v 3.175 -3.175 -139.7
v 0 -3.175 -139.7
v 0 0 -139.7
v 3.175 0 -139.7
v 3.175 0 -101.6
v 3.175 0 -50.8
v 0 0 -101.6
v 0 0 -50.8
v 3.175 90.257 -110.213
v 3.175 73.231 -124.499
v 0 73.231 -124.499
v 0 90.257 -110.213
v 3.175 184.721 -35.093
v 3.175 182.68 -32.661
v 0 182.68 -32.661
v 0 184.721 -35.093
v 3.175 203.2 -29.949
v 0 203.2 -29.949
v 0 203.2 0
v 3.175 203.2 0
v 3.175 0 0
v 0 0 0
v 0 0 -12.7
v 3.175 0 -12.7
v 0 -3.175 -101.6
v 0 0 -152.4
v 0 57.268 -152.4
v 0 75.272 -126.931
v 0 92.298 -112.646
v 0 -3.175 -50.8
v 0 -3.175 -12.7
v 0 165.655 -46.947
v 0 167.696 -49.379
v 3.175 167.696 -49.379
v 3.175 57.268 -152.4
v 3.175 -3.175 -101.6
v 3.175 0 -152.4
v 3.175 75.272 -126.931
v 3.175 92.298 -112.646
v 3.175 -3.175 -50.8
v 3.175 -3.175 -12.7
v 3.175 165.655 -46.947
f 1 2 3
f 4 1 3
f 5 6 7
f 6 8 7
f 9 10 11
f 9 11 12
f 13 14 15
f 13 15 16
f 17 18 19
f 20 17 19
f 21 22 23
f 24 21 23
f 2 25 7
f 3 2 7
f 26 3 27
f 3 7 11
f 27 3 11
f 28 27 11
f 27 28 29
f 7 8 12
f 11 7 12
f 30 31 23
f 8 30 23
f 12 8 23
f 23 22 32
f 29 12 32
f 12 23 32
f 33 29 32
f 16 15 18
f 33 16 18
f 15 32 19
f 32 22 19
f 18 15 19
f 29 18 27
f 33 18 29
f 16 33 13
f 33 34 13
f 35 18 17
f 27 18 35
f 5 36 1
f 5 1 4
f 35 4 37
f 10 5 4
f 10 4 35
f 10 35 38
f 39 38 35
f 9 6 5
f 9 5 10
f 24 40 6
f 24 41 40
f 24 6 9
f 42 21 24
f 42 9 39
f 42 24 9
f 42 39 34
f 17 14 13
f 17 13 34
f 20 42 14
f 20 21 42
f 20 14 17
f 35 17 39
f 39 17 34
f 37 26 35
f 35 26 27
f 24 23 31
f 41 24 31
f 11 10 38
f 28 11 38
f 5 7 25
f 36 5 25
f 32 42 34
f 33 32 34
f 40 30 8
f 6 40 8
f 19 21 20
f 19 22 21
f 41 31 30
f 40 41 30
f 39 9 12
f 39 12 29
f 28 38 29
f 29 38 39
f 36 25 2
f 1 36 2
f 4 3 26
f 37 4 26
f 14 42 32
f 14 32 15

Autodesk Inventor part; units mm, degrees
ref_plane "YZ Plane" through (0, 0, 0) normal (1, 0, 0) x (0, 1, 0)
ref_plane "XZ Plane" through (0, 0, 0) normal (0, 1, 0) x (-1, 0, 0)
ref_plane "XY Plane" through (0, 0, 0) normal (0, 0, 1) x (1, 0, 0)
sketch "Sketch2" plane through (0, 0, 0) normal (1, 0, 0) x (0, 1, 0)
  line L0 (0, 0) -> (0, -12.7)
  line L1 (0, -12.7) -> (-3.175, -12.7)
  line L2 (-3.175, -12.7) -> (-3.175, -50.8)
  line L3 (-3.175, -50.8) -> (0, -50.8)
  line L4 (0, -50.8) -> (0, -101.6)
  line L5 (0, -101.6) -> (-3.175, -101.6)
  line L6 (-3.175, -101.6) -> (-3.175, -139.7)
  line L7 (-3.175, -139.7) -> (0, -139.7)
  line L8 (0, -139.7) -> (0, -152.4)
  line L9 (0, 0) -> (203.2, 0)
  line L10 (203.2, -29.949) -> (57.2685, -152.4)
  line L11 (203.2, -29.949) -> (203.2, 0)
  line L12 (0, -152.4) -> (57.2685, -152.4)
  dimension "d18" = 12.7
  dimension "d19" = 3.175
  dimension "d20" = 38.1
  dimension "d21" = 3.175
  dimension "d22" = 50.8
  dimension "d23" = 3.175
  dimension "d24" = 38.1
  dimension "d25" = 3.175
  dimension "d26" = 12.7
  dimension "d27" = 203.2
  dimension "d28" = 190.5
  dimension "d29" = 90
  dimension "d30" = -130
  dimension "d31" = 0
extrude "Extrusion2" add sketch "Sketch2" along normal blind 3.175
sketch "Sketch3" plane through (3.175, 0, 0) normal (1, 0, 0) x (0, 0, -1)
  line L0 (152.4, 57.2685) -> (29.949, 203.2) projected
  line L1 (152.4, 57.2685) -> (137.8069, 45.0234)
  line L2 (137.8069, 45.0234) -> (15.3558, 190.9549)
  line L3 (15.3558, 190.9549) -> (29.949, 203.2)
  line L4 (146.3195, 52.1664) -> (23.8685, 198.0979)
  line L5 (143.8873, 50.1256) -> (21.4363, 196.057)
  line L6 (32.661, 182.68) -> (35.0932, 184.7208)
  line L7 (46.9469, 165.6546) -> (49.3791, 167.6955)
  line L8 (110.2133, 90.2567) -> (112.6455, 92.2976)
  line L9 (124.4992, 73.2314) -> (126.9314, 75.2722)
  point P0 (0, 0)
  dimension "d34" = 19.05
  dimension "d35" = 3.175
  dimension "d36" = 7.9375
  dimension "d37" = 17.4625
  dimension "d38" = 22.225
  dimension "d39" = 98.425
  dimension "d40" = 22.225
extrude "Extrusion3" cut sketch "Sketch3" against normal blind 3.175 contours L9 L5 L8 L4 | L4 L7 L5 L6
properties part number "C4Side"
